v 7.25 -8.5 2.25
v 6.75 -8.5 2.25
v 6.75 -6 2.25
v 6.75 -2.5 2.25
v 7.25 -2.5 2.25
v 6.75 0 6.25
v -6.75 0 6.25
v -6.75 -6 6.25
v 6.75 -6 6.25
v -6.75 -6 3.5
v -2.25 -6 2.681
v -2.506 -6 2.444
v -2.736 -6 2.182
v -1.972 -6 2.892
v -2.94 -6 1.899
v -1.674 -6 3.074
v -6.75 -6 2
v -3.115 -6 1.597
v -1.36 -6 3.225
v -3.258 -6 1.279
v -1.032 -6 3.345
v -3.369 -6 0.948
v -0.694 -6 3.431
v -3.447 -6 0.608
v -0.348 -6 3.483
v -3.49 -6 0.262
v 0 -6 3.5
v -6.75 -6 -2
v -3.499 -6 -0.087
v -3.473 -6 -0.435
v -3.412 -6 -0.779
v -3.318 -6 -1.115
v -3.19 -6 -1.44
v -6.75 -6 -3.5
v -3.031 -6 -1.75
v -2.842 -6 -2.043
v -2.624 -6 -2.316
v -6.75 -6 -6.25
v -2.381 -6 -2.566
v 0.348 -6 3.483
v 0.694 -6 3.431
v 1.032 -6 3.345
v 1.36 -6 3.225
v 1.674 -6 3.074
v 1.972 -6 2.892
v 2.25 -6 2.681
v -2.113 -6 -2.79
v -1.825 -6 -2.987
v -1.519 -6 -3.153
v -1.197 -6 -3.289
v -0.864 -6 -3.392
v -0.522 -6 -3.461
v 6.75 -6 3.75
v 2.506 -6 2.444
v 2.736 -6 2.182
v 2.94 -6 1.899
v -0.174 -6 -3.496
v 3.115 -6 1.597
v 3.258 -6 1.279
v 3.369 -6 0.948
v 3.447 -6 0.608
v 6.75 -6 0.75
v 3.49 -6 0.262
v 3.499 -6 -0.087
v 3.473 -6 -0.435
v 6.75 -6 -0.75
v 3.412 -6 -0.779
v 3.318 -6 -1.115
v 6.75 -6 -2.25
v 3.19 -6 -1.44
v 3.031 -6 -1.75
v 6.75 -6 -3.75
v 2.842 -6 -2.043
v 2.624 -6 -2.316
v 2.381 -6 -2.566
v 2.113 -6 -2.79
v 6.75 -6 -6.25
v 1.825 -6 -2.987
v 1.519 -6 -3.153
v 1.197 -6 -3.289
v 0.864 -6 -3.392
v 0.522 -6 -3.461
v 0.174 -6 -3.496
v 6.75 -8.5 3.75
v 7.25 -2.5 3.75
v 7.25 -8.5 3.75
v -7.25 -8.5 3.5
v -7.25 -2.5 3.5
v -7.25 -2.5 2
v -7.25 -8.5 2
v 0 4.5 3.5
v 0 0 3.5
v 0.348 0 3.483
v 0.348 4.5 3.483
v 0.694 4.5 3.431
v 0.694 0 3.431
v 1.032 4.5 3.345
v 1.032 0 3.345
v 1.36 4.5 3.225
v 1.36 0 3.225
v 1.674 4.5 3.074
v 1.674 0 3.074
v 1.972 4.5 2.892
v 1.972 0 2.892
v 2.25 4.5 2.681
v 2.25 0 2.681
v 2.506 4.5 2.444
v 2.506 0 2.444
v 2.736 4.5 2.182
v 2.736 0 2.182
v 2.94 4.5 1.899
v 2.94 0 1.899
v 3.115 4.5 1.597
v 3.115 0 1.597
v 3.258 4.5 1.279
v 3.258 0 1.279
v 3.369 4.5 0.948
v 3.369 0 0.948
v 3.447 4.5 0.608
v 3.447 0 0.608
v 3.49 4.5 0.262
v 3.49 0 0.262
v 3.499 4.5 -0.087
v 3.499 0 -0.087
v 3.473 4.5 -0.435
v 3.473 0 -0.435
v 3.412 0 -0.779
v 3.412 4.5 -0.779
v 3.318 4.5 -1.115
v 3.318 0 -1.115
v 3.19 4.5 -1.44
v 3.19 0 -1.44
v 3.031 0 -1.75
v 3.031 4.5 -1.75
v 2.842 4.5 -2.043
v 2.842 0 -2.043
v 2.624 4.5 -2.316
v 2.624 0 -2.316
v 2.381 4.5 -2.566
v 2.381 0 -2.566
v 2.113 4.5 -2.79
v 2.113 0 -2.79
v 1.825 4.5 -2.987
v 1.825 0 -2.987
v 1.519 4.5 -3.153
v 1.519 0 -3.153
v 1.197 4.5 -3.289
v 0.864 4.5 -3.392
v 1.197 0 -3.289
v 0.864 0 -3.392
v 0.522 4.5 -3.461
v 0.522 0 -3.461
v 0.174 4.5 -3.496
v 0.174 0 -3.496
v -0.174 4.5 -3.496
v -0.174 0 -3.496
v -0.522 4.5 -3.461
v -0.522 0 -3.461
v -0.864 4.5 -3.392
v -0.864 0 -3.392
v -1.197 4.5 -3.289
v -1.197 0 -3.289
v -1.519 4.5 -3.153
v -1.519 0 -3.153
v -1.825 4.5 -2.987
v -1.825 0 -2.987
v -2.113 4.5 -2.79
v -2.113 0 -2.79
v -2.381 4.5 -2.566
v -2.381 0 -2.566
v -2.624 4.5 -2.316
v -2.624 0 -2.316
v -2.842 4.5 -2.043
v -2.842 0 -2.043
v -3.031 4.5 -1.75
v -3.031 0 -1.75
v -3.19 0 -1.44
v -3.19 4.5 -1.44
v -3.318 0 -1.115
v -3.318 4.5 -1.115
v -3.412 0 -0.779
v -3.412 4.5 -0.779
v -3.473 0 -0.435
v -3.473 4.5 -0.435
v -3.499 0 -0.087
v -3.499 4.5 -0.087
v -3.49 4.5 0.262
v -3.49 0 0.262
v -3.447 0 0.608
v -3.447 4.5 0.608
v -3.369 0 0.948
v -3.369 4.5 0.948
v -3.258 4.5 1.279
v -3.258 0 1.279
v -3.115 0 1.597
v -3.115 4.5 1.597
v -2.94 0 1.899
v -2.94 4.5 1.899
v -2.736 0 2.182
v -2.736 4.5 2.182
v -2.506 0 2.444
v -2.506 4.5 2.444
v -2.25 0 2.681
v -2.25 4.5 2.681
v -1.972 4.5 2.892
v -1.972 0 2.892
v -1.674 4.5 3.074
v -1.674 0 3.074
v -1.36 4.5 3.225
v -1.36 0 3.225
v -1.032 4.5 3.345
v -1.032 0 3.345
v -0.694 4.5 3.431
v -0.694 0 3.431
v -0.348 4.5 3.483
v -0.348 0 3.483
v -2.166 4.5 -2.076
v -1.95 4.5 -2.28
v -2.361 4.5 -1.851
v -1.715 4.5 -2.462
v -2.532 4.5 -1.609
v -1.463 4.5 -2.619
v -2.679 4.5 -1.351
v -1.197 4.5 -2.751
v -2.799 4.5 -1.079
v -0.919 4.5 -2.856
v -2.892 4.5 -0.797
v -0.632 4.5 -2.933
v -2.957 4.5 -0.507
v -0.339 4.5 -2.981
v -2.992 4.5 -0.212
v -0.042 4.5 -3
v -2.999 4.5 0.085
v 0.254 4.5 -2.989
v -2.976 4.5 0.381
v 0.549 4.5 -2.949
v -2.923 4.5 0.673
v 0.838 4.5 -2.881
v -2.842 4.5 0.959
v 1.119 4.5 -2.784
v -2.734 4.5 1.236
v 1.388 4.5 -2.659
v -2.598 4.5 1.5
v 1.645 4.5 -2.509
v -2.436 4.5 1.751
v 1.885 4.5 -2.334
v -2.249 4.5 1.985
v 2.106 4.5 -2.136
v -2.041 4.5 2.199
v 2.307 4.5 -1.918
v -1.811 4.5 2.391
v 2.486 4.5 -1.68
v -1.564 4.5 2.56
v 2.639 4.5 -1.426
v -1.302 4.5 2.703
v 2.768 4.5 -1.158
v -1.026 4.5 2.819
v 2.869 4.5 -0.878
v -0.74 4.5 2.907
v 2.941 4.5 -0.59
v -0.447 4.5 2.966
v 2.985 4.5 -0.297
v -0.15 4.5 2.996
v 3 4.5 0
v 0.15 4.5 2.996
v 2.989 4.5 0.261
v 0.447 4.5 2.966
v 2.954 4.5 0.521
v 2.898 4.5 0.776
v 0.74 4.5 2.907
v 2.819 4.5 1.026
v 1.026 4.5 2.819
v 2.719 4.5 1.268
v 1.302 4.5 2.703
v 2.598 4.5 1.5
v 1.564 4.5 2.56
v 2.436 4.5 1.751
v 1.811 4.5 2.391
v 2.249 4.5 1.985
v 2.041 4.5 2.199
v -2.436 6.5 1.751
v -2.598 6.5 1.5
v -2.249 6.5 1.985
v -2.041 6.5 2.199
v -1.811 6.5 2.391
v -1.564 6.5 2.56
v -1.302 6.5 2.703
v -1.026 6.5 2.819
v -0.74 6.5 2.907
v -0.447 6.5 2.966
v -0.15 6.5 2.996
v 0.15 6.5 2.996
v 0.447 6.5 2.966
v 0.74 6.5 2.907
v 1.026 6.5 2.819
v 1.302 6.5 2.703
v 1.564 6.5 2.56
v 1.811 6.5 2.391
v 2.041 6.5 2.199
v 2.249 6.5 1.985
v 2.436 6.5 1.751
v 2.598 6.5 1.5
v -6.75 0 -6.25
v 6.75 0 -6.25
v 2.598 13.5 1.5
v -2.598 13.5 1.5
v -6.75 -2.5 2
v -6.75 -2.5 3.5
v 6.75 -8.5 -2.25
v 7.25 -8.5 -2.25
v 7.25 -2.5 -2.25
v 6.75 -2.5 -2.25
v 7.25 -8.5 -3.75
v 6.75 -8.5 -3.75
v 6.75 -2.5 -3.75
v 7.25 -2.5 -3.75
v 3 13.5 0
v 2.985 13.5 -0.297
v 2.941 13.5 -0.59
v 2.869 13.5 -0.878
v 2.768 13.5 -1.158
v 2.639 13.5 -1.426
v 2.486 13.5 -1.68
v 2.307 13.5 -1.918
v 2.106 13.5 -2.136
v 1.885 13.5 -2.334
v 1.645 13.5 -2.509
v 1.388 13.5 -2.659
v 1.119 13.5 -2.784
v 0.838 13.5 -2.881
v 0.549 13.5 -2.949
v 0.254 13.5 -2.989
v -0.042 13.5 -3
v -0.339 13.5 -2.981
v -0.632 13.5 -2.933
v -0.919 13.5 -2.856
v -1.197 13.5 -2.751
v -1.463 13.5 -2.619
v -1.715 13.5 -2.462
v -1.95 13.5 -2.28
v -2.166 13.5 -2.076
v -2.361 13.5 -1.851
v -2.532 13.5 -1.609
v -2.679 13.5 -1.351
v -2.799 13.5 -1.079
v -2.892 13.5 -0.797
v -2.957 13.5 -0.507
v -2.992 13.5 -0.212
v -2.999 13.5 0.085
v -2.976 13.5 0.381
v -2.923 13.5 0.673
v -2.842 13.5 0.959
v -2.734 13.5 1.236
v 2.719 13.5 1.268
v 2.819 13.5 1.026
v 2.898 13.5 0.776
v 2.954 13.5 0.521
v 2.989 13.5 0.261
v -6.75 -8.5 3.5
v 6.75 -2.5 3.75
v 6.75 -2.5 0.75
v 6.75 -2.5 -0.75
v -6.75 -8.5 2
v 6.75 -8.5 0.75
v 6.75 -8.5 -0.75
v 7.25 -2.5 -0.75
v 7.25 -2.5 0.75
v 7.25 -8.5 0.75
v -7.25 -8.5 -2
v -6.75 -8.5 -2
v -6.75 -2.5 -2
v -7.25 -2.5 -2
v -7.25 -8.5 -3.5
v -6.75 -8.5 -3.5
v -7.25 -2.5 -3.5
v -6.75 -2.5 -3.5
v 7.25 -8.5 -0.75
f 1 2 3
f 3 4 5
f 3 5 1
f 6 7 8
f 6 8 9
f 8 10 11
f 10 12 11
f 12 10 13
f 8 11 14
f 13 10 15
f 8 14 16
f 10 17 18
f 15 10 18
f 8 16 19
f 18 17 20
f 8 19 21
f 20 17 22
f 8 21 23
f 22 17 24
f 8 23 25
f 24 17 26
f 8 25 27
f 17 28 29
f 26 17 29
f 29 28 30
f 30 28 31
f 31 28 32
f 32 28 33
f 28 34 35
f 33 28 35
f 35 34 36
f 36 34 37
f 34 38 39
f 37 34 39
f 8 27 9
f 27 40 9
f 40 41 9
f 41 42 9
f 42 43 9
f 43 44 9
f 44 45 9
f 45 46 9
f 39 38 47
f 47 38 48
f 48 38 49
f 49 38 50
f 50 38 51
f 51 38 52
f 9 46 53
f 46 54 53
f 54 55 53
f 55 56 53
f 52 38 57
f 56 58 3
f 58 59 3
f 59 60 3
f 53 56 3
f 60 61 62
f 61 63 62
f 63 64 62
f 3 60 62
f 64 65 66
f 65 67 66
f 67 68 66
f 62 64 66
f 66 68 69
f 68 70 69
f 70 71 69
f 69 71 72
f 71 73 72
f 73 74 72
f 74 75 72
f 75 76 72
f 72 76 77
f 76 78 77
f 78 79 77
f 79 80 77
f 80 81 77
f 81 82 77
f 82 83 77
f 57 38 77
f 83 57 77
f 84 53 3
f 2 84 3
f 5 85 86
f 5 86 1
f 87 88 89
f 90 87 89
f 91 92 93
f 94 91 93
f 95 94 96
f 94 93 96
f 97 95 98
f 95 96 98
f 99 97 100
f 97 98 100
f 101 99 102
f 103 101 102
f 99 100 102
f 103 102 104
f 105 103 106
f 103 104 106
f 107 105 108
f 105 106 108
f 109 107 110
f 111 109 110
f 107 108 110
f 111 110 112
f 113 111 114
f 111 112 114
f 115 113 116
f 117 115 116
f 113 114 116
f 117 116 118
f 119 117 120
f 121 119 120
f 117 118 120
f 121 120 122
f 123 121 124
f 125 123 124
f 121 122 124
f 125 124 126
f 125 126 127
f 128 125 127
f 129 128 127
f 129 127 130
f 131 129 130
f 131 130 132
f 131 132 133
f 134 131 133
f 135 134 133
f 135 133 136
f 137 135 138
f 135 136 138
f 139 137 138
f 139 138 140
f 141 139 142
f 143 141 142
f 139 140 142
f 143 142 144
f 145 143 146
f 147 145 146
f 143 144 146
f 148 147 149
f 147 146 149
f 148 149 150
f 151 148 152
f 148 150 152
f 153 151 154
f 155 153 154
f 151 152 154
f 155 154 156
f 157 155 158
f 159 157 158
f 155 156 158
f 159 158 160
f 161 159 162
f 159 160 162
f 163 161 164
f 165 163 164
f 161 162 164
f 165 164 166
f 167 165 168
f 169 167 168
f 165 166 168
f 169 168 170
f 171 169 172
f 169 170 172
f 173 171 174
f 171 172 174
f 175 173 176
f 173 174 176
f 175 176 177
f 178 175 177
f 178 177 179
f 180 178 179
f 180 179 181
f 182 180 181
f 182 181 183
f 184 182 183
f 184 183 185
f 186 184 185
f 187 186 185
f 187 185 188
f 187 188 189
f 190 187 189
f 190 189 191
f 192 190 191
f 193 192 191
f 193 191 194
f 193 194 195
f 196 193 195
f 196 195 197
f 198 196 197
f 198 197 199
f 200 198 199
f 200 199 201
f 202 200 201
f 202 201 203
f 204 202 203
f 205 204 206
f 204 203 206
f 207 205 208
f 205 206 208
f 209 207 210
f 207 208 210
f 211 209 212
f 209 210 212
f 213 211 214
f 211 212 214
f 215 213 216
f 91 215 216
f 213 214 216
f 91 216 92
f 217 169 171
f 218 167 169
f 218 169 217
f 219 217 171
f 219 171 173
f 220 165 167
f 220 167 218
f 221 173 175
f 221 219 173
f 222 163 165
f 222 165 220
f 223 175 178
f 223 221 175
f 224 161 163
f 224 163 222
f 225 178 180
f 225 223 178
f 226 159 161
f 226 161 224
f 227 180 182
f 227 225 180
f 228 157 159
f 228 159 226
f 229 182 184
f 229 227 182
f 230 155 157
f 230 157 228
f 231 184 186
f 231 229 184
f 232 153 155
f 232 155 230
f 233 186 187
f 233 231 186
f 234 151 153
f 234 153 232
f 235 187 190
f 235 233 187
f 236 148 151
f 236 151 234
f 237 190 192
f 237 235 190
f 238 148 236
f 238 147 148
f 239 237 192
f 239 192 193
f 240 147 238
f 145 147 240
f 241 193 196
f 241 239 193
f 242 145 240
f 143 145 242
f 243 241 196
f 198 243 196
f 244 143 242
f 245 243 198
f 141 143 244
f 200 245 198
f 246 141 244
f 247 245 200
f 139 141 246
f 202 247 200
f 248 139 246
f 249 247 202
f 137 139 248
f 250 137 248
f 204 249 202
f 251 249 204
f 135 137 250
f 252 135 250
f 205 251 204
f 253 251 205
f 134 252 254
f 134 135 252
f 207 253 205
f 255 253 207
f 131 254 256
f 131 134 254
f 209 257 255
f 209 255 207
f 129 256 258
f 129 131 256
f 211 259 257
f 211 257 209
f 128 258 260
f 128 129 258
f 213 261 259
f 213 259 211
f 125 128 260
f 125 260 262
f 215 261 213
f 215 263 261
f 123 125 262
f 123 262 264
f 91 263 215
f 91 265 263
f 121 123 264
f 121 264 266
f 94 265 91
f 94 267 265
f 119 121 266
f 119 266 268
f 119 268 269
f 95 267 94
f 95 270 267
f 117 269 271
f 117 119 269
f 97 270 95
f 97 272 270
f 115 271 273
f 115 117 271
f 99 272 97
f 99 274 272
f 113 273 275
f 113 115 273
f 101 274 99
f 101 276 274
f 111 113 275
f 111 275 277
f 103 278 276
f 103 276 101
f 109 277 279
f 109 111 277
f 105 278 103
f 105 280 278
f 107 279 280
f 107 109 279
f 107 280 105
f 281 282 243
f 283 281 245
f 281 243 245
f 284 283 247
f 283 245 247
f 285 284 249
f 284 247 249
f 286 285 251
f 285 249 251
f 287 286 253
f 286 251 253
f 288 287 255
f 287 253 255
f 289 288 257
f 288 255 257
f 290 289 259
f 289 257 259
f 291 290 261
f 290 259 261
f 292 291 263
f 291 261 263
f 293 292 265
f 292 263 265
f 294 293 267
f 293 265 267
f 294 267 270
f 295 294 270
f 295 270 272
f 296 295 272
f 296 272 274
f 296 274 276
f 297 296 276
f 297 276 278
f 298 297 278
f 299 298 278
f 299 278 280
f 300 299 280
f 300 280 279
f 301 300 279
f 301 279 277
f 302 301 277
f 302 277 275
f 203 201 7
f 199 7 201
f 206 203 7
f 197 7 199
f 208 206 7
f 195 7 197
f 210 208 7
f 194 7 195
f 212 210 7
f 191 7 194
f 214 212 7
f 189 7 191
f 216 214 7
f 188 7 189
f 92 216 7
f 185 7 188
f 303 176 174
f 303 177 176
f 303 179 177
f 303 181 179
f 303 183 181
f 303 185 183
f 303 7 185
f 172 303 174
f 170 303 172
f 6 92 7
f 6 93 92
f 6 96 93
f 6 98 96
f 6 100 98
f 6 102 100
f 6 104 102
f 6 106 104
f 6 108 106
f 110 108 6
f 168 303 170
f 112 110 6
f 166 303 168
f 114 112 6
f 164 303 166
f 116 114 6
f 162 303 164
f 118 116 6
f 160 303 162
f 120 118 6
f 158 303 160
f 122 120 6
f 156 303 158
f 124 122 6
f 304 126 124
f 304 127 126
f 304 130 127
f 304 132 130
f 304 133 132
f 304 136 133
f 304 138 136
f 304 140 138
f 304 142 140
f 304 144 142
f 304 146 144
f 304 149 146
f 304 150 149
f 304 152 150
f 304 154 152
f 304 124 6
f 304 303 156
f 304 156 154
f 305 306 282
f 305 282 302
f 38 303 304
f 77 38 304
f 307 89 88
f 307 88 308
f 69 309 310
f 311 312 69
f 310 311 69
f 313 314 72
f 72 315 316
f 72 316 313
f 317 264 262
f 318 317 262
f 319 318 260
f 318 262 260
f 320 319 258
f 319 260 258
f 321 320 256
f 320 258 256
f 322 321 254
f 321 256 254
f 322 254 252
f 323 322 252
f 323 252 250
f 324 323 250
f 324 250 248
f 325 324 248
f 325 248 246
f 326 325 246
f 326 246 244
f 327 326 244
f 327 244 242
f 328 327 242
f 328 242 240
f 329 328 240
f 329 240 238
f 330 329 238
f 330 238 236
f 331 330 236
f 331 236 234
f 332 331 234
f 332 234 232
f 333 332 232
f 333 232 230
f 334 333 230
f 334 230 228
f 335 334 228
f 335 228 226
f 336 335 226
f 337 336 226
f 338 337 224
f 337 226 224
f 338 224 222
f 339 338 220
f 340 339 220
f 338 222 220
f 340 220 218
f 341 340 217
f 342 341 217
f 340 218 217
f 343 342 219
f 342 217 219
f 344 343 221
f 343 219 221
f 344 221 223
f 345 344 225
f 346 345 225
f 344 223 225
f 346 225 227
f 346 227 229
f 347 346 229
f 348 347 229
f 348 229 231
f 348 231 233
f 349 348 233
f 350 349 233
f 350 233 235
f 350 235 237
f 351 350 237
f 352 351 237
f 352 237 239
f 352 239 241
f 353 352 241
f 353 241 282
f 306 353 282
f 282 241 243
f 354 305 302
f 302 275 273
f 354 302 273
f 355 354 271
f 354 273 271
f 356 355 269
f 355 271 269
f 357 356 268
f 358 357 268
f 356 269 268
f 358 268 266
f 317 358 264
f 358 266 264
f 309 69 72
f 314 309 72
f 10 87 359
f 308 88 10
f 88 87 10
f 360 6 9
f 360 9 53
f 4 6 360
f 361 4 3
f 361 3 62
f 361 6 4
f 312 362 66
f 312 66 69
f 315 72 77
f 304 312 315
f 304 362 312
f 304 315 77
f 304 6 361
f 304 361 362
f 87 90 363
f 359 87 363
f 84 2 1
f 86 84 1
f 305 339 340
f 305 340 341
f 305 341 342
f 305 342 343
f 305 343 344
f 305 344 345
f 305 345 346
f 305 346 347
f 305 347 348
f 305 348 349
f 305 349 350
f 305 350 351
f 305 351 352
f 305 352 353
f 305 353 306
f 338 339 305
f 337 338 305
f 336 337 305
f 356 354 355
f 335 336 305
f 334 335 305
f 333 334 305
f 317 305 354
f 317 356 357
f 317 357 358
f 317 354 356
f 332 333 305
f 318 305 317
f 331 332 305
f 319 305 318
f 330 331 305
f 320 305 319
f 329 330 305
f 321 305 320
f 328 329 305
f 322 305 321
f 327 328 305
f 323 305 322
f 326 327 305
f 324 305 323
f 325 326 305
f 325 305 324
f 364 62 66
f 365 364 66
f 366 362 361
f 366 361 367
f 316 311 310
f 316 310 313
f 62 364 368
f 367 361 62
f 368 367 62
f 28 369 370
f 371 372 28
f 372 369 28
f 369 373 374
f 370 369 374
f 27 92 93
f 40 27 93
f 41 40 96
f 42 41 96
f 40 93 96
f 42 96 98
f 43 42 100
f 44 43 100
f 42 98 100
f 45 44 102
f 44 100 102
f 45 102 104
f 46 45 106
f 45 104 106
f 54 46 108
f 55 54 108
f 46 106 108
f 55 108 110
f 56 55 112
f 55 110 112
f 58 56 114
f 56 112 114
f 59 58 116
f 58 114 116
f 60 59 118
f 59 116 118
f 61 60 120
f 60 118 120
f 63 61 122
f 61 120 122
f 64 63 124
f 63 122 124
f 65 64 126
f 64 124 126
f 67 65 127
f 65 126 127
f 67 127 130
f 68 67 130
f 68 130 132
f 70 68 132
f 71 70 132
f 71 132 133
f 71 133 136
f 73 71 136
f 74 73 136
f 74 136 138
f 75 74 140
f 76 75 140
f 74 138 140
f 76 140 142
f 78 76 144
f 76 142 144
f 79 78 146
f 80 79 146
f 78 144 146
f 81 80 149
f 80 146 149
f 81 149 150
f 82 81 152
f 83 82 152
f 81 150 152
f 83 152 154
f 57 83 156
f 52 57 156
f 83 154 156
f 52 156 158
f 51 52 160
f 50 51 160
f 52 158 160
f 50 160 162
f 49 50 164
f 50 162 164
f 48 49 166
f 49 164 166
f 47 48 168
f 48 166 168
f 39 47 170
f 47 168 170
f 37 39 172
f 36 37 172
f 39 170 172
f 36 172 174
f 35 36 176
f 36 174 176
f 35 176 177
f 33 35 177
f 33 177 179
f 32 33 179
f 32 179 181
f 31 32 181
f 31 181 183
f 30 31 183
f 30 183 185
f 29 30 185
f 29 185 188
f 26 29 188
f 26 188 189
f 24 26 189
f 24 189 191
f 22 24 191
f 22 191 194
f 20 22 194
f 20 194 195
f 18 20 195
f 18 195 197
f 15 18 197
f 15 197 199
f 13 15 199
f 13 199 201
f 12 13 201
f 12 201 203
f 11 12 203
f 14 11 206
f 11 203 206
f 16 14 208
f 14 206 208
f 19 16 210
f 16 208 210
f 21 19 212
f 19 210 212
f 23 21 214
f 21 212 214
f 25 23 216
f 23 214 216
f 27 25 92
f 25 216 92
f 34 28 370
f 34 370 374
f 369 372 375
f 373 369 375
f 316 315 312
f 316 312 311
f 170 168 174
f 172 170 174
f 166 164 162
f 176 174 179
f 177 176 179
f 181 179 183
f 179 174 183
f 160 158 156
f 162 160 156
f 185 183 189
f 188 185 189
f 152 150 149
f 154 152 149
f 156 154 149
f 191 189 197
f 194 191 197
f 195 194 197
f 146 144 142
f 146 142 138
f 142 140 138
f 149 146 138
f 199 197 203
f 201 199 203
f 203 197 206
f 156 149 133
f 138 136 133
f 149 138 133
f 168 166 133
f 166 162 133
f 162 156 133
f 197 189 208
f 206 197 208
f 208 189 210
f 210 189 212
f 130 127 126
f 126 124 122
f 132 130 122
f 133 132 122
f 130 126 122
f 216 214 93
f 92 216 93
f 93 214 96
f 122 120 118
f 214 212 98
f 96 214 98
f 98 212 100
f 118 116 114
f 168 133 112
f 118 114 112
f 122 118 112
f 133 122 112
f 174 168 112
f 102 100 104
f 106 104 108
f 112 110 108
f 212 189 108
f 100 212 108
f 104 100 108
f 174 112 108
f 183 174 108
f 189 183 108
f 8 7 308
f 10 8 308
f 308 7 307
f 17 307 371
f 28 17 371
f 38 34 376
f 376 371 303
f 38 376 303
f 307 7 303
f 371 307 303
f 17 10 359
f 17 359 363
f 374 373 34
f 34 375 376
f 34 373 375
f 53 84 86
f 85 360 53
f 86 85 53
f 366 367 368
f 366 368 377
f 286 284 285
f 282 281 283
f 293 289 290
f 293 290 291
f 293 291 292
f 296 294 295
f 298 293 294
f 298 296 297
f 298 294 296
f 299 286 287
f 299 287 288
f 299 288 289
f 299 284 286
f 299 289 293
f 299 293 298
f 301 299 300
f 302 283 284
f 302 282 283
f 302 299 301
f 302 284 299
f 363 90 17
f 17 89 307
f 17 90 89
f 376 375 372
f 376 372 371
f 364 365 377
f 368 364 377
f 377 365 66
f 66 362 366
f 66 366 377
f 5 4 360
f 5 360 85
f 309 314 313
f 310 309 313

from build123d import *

# Parameters (mm, degrees)
EXTRUDE_1_DEPTH = 13.5
EXTRUDE_2_DEPTH = 6.5
SKETCH_1_4_R    = 3.5
EXTRUDE_3_DEPTH = 4.5
SKETCH_1_5_W    = 13.5
SKETCH_1_5_H    = 12.5
SKETCH_1_5_R    = 3.5
EXTRUDE_4_DEPTH = 6
EXTRUDE_START   = -2.5
SKETCH_2_W      = 0.5
SKETCH_2_H      = 1.5
EXTRUDE_5_DEPTH = 6


with BuildPart() as part:
    # Эскиз1 → Бобышка-Вытянуть1 (new body)
    with BuildSketch(Plane(origin=(0, 0, 0), x_dir=(1, 0, 0), z_dir=(0, 1, 0))):
        with BuildLine():
            ThreePointArc((3, 0), (-0.776457135, 2.897777479), (-2.598076211, -1.5))
            Line((-2.598076211, -1.5), (2.598076211, -1.5))
            ThreePointArc((2.598076211, -1.5), (2.897777479, -0.776457135), (3, 0))
        make_face()
    extrude(amount=EXTRUDE_1_DEPTH)

    # Эскиз1<3> → Бобышка-Вытянуть2 (add)
    with BuildSketch(Plane(origin=(0, 0, 0), x_dir=(1, 0, 0), z_dir=(0, 1, 0))):
        with BuildLine():
            Line((2.598076211, -1.5), (-2.598076211, -1.5))
            ThreePointArc((-2.598076211, -1.5), (0, -3), (2.598076211, -1.5))
        make_face()
    extrude(amount=EXTRUDE_2_DEPTH)

    # Эскиз1<4> → Бобышка-Вытянуть3 (add)
    with BuildSketch(Plane(origin=(0, 0, 0), x_dir=(1, 0, 0), z_dir=(0, 1, 0))):
        Circle(SKETCH_1_4_R)
    extrude(amount=EXTRUDE_3_DEPTH)


with BuildPart() as body_2:
    # Эскиз1<5> → Бобышка-Вытянуть4 (new body)
    with BuildSketch(Plane(origin=(0, 0, 0), x_dir=(1, 0, 0), z_dir=(0, 1, 0))):
        Rectangle(SKETCH_1_5_W, SKETCH_1_5_H)
        Circle(SKETCH_1_5_R, mode=Mode.SUBTRACT)
    extrude(amount=-EXTRUDE_4_DEPTH)

    # Эскиз2 → Бобышка-Вытянуть5 (add)
    with BuildSketch(Plane(origin=(0, 0, 0), x_dir=(1, 0, 0), z_dir=(0, 1, 0)).offset(EXTRUDE_START)):
        with Locations((7, 3)):
            Rectangle(SKETCH_2_W, SKETCH_2_H)
        with Locations((7, 0)):
            Rectangle(SKETCH_2_W, SKETCH_2_H)
        with Locations((7, -3)):
            Rectangle(SKETCH_2_W, SKETCH_2_H)
        with Locations((-7, 2.75)):
            Rectangle(SKETCH_2_W, SKETCH_2_H)
        with Locations((-7, -2.75)):
            Rectangle(SKETCH_2_W, SKETCH_2_H)
    extrude(amount=-EXTRUDE_5_DEPTH)


solid = Compound([part.part, body_2.part])
